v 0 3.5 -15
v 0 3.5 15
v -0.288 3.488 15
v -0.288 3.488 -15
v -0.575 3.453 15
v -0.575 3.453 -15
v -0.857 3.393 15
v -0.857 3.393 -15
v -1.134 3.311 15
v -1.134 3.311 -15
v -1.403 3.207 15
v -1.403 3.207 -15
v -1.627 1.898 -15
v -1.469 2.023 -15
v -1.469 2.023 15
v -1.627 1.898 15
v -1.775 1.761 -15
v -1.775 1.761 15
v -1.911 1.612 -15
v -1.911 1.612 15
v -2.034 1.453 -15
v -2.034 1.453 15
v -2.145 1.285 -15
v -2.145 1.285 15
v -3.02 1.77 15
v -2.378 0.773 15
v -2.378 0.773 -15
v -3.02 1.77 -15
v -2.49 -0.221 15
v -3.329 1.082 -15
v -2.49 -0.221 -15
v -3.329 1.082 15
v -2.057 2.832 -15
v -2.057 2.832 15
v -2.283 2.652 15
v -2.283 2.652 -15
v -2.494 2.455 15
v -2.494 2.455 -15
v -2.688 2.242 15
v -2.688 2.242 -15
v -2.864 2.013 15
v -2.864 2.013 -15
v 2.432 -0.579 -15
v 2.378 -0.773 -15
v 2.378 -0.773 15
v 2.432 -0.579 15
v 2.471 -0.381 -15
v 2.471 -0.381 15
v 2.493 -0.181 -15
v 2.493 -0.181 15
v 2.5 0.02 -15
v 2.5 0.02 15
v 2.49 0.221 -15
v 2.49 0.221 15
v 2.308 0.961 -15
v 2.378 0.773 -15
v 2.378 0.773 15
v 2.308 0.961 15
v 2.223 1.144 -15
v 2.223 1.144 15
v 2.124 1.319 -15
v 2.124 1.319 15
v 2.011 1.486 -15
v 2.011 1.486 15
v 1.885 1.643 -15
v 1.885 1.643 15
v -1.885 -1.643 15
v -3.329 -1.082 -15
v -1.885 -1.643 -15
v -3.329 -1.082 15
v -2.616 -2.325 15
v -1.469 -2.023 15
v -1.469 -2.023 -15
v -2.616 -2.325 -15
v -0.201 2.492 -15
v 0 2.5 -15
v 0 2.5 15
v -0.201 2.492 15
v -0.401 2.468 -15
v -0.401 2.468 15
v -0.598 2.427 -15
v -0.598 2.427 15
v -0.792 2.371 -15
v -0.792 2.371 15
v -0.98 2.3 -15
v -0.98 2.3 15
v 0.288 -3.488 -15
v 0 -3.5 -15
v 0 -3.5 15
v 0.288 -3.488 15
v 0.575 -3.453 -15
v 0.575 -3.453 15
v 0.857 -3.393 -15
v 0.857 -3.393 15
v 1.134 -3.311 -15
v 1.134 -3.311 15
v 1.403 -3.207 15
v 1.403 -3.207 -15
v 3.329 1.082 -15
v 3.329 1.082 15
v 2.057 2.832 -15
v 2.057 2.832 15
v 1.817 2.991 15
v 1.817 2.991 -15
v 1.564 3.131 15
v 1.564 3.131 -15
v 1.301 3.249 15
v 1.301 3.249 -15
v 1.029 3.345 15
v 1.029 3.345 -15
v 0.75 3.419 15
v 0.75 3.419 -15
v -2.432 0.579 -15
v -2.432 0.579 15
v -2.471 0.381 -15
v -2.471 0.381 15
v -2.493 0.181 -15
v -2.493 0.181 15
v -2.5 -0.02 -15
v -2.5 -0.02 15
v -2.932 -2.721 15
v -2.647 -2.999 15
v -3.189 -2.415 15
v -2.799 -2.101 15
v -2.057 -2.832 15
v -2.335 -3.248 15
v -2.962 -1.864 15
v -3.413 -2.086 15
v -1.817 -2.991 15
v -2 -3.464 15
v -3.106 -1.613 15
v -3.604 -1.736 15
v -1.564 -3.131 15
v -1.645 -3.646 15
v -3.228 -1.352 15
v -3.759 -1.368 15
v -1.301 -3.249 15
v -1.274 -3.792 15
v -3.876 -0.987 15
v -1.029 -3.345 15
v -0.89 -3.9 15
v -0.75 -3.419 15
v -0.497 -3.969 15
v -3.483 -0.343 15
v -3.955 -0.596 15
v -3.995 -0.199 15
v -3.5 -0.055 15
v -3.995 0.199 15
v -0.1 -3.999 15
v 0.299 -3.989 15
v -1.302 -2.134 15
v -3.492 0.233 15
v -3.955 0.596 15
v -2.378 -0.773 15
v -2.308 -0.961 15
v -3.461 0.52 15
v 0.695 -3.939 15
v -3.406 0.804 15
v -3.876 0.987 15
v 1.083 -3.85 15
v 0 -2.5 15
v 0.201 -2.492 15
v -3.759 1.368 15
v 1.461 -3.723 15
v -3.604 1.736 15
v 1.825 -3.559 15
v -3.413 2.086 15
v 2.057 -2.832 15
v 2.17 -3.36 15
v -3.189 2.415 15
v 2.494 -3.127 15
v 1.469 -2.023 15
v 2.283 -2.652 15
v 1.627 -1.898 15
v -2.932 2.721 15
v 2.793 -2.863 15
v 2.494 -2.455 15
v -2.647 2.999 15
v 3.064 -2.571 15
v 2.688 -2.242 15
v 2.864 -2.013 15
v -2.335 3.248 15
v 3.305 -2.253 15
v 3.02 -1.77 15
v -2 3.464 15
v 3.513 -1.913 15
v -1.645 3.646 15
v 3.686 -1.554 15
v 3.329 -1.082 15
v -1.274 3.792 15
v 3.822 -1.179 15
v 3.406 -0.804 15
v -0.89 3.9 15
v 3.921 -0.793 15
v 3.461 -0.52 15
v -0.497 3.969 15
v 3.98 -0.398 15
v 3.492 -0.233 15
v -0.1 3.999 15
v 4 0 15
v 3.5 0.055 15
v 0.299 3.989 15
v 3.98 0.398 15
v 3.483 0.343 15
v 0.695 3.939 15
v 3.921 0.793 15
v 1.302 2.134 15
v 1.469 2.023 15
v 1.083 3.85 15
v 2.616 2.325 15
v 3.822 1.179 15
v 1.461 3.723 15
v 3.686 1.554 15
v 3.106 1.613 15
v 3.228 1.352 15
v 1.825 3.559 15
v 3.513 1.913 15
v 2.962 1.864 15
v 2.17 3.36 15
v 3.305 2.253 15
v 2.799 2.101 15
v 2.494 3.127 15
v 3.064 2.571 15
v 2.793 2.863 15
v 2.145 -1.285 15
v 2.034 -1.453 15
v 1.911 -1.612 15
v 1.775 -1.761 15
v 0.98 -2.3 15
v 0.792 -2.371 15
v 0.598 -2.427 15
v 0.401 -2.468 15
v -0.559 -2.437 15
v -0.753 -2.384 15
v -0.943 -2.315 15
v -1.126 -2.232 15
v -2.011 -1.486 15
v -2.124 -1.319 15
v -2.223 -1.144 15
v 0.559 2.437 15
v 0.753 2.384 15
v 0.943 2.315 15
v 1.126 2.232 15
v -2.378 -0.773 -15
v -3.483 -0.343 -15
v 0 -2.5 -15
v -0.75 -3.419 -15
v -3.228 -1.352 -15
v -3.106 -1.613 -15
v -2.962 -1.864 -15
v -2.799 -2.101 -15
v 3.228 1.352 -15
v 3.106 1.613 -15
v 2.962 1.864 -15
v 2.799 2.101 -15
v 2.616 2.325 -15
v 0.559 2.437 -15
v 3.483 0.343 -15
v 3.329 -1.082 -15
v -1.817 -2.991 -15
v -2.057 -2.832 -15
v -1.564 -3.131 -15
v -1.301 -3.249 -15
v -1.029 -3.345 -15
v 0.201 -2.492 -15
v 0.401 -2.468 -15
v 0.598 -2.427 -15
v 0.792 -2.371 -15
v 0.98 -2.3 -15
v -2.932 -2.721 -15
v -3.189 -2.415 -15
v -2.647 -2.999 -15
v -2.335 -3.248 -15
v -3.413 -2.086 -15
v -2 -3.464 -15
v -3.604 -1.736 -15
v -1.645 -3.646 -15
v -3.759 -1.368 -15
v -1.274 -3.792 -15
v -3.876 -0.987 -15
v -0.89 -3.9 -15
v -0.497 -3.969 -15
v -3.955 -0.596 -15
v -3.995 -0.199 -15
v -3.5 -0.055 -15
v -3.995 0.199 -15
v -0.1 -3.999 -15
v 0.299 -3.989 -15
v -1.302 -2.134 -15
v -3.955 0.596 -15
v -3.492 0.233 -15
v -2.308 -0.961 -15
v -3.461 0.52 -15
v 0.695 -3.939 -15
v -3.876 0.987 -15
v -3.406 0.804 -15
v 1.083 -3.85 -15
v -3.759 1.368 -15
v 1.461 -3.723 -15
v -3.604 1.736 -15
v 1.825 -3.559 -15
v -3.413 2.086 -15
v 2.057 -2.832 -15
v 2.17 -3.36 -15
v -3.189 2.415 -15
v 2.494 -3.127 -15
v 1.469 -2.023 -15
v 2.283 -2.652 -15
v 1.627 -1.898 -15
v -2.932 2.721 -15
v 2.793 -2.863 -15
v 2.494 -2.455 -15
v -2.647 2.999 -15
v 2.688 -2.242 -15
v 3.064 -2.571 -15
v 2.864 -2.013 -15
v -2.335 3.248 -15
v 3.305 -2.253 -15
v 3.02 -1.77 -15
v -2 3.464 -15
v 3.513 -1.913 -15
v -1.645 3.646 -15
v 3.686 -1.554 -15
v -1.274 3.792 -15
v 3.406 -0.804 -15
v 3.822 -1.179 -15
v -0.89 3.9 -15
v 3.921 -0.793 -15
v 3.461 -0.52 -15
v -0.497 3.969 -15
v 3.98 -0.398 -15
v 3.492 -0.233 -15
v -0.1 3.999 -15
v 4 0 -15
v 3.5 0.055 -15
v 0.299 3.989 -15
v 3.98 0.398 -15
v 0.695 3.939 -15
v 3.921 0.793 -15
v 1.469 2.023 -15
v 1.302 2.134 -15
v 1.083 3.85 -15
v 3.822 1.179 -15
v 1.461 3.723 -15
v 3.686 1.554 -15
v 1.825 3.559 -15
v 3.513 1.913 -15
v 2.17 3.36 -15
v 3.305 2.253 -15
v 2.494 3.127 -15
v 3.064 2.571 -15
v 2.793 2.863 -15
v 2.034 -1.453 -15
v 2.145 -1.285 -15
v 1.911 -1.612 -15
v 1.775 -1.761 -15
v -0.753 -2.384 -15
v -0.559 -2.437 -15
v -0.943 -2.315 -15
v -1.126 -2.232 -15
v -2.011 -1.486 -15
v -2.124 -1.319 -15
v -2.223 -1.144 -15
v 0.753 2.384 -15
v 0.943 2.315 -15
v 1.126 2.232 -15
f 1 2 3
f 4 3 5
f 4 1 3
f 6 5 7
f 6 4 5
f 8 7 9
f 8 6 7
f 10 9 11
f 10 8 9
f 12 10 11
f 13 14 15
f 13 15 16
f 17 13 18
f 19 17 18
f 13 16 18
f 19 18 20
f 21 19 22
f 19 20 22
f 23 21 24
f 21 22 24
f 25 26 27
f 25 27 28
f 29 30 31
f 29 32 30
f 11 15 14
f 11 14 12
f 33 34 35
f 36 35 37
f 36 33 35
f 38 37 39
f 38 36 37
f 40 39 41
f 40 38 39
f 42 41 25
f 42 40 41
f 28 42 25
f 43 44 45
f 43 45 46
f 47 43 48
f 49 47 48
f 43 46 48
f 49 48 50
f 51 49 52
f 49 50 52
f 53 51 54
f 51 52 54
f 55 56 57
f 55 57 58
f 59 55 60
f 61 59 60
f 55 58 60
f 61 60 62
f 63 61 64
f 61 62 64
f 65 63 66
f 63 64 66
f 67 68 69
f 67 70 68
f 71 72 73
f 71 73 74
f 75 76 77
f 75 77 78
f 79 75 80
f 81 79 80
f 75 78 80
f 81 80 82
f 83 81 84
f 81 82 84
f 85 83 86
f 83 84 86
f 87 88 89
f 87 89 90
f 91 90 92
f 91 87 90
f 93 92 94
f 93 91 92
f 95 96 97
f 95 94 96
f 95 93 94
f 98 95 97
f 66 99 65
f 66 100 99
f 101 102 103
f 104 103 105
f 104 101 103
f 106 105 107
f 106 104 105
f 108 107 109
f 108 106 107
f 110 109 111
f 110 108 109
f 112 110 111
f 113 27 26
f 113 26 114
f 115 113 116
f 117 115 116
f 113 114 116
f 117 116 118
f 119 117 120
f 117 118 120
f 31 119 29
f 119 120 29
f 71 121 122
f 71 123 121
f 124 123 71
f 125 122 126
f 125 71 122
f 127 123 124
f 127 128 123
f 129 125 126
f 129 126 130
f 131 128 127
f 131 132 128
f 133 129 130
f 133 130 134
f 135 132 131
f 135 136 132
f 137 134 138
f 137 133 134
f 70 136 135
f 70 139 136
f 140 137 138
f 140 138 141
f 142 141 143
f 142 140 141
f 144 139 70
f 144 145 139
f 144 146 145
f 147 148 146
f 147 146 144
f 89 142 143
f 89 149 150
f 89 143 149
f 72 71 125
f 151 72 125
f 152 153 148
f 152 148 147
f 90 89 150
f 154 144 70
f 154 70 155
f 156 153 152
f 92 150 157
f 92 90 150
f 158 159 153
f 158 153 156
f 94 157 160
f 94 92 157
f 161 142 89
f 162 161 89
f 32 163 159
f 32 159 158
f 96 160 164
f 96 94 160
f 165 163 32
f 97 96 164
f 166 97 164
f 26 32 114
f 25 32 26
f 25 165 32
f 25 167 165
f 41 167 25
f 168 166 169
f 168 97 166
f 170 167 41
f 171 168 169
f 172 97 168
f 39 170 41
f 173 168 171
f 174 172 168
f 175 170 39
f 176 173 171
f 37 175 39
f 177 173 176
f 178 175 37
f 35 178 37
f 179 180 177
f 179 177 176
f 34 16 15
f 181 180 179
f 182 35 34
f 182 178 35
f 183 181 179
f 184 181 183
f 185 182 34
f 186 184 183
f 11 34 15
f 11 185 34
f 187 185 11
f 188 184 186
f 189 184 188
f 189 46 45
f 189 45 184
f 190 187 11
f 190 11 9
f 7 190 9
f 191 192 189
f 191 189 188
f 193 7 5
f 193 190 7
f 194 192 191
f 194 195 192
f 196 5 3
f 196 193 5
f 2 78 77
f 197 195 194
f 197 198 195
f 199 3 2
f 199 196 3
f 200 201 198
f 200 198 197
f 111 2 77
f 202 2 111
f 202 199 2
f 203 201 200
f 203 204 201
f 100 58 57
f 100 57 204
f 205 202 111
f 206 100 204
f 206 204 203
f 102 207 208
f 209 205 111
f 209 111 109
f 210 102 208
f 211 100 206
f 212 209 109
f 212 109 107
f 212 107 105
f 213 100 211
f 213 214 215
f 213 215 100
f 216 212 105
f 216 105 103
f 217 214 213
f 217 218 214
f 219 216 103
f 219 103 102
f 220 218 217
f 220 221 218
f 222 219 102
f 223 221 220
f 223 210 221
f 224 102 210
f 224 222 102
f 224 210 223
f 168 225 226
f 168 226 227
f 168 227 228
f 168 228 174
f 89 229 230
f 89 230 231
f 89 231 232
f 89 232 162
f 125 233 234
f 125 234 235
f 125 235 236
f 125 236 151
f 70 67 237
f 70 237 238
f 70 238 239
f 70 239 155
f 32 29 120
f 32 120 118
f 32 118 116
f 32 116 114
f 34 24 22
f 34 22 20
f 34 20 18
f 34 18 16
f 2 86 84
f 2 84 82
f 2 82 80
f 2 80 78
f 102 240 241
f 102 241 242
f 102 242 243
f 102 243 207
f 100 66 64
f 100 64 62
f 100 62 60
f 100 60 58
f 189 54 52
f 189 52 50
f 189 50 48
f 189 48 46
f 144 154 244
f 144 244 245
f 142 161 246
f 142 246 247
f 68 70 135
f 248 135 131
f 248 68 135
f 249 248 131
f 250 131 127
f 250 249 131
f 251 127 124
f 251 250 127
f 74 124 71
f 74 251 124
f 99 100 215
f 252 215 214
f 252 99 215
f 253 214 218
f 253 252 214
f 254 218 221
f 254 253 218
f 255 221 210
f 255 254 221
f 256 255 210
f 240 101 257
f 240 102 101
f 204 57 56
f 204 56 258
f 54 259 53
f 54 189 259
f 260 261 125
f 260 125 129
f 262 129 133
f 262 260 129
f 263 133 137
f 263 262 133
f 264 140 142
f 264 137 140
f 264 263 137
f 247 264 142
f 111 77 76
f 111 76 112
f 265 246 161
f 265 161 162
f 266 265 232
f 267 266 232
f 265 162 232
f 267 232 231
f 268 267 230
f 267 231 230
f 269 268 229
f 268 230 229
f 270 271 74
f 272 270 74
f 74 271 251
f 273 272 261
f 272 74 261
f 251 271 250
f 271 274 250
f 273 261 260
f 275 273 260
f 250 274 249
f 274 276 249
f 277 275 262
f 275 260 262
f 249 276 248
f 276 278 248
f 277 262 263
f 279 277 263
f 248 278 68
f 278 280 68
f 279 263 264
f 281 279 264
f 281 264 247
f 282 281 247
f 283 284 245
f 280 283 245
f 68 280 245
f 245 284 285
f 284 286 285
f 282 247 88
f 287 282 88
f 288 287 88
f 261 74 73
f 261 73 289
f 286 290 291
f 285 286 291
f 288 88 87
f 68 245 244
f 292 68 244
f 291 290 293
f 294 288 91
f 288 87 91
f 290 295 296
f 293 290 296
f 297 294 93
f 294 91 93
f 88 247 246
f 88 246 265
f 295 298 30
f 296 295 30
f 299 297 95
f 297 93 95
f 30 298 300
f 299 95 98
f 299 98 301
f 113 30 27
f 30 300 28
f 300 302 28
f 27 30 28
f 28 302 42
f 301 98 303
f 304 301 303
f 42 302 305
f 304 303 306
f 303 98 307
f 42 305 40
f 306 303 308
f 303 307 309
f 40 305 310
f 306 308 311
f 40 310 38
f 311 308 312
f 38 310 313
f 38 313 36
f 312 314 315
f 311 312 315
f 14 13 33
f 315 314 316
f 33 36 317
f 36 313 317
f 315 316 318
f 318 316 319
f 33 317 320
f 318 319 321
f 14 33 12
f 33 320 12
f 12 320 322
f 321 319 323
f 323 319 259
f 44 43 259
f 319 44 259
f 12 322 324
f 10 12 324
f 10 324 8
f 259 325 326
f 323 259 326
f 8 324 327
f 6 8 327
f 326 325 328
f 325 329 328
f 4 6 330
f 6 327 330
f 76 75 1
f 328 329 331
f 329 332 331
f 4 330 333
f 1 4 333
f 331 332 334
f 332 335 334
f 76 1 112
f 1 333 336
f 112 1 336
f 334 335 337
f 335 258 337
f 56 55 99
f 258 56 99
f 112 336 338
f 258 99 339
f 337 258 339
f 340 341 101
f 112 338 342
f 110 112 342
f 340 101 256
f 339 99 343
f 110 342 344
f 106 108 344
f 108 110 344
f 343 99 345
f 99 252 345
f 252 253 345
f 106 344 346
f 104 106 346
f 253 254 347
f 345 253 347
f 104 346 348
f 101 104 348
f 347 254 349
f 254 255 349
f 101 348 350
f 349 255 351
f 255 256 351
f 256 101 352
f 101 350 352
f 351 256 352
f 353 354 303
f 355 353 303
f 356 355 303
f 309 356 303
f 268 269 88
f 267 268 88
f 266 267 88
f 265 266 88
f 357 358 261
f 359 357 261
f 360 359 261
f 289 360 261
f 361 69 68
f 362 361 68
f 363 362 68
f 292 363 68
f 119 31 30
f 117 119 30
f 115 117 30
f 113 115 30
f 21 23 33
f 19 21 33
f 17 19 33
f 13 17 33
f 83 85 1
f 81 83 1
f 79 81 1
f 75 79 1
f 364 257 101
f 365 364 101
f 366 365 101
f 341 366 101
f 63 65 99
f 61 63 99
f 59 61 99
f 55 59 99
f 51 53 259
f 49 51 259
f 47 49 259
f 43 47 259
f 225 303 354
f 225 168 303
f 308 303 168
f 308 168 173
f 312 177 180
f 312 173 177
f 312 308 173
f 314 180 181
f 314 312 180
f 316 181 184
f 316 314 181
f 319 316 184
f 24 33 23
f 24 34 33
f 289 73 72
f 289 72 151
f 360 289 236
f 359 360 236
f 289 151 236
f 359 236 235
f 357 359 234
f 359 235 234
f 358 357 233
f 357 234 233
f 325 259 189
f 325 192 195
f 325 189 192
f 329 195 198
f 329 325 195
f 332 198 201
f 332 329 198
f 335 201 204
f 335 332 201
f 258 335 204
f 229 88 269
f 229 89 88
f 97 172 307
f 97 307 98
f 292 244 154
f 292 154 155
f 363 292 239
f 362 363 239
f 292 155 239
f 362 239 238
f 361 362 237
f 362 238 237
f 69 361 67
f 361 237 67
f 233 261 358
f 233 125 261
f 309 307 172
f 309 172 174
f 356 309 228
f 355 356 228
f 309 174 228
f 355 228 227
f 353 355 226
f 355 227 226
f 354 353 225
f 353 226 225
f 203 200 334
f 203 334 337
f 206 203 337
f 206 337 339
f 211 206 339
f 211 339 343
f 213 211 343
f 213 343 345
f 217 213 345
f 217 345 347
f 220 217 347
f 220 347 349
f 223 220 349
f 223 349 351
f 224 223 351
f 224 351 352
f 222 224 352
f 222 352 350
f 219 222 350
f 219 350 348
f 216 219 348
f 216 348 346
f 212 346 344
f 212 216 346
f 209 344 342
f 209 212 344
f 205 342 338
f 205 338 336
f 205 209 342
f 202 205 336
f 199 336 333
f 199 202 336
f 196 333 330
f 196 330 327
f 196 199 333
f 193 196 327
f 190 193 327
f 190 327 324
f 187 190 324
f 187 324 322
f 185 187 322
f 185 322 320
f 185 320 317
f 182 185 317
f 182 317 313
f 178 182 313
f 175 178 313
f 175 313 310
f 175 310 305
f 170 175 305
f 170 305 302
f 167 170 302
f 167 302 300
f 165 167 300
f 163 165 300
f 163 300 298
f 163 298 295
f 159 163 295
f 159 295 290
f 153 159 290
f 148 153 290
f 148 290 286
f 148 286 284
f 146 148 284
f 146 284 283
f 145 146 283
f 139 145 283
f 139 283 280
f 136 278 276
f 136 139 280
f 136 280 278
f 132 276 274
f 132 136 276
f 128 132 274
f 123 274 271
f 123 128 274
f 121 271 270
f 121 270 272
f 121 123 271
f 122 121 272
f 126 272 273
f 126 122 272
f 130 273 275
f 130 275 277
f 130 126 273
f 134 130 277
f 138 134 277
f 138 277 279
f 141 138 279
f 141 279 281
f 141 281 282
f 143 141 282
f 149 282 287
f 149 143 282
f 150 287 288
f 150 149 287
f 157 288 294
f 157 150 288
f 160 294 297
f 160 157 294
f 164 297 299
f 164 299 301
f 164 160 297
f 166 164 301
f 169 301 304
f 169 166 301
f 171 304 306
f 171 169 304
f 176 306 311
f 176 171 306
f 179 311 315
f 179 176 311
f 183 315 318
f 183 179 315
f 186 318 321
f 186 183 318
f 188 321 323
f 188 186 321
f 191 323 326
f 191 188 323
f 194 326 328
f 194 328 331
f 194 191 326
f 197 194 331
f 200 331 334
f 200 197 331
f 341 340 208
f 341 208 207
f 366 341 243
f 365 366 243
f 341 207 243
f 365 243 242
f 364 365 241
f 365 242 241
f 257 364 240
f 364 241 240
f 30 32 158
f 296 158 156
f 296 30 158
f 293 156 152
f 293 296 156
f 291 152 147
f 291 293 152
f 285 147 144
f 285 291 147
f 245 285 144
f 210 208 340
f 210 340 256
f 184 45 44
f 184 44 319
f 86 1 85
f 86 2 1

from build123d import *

# Parameters (mm, degrees)
SKETCH001_R        = 4
SKETCH001_R_2      = 3.5
PAD_DEPTH          = 15
PAD001_DEPTH       = 15
POLARPATTERN_COUNT = 10


with BuildPart() as part:
    # Sketch001 → Pad (new body, symmetric)
    with BuildSketch(Plane.XY):
        Circle(SKETCH001_R)
        Circle(SKETCH001_R_2, mode=Mode.SUBTRACT)
    extrude(amount=PAD_DEPTH, both=True)

    # Sketch → Pad001 (join, symmetric)
    with BuildSketch(Plane.XY):
        with BuildLine():
            Line((0, 3.5), (-0.979796, 2.3))
            ThreePointArc((0, 2.5), (-0.5, 2.44949), (-0.979796, 2.3))
            Line((0, 2.5), (0.750097, 3.418677))
            ThreePointArc((0.750097, 3.418677), (0.377246, 3.47961), (0, 3.5))
        make_face()
    extrude(amount=PAD001_DEPTH, both=True)

    # PolarPattern: part ×10 about axis
    polarpattern_axis = Axis((0, 0, 0), (0, 0, 1))


with BuildPart() as part_1:
    add(part.part)
    for i in range(1, POLARPATTERN_COUNT):
        add(part.part.rotate(polarpattern_axis, i * 360 / POLARPATTERN_COUNT))


solid = part_1.part
